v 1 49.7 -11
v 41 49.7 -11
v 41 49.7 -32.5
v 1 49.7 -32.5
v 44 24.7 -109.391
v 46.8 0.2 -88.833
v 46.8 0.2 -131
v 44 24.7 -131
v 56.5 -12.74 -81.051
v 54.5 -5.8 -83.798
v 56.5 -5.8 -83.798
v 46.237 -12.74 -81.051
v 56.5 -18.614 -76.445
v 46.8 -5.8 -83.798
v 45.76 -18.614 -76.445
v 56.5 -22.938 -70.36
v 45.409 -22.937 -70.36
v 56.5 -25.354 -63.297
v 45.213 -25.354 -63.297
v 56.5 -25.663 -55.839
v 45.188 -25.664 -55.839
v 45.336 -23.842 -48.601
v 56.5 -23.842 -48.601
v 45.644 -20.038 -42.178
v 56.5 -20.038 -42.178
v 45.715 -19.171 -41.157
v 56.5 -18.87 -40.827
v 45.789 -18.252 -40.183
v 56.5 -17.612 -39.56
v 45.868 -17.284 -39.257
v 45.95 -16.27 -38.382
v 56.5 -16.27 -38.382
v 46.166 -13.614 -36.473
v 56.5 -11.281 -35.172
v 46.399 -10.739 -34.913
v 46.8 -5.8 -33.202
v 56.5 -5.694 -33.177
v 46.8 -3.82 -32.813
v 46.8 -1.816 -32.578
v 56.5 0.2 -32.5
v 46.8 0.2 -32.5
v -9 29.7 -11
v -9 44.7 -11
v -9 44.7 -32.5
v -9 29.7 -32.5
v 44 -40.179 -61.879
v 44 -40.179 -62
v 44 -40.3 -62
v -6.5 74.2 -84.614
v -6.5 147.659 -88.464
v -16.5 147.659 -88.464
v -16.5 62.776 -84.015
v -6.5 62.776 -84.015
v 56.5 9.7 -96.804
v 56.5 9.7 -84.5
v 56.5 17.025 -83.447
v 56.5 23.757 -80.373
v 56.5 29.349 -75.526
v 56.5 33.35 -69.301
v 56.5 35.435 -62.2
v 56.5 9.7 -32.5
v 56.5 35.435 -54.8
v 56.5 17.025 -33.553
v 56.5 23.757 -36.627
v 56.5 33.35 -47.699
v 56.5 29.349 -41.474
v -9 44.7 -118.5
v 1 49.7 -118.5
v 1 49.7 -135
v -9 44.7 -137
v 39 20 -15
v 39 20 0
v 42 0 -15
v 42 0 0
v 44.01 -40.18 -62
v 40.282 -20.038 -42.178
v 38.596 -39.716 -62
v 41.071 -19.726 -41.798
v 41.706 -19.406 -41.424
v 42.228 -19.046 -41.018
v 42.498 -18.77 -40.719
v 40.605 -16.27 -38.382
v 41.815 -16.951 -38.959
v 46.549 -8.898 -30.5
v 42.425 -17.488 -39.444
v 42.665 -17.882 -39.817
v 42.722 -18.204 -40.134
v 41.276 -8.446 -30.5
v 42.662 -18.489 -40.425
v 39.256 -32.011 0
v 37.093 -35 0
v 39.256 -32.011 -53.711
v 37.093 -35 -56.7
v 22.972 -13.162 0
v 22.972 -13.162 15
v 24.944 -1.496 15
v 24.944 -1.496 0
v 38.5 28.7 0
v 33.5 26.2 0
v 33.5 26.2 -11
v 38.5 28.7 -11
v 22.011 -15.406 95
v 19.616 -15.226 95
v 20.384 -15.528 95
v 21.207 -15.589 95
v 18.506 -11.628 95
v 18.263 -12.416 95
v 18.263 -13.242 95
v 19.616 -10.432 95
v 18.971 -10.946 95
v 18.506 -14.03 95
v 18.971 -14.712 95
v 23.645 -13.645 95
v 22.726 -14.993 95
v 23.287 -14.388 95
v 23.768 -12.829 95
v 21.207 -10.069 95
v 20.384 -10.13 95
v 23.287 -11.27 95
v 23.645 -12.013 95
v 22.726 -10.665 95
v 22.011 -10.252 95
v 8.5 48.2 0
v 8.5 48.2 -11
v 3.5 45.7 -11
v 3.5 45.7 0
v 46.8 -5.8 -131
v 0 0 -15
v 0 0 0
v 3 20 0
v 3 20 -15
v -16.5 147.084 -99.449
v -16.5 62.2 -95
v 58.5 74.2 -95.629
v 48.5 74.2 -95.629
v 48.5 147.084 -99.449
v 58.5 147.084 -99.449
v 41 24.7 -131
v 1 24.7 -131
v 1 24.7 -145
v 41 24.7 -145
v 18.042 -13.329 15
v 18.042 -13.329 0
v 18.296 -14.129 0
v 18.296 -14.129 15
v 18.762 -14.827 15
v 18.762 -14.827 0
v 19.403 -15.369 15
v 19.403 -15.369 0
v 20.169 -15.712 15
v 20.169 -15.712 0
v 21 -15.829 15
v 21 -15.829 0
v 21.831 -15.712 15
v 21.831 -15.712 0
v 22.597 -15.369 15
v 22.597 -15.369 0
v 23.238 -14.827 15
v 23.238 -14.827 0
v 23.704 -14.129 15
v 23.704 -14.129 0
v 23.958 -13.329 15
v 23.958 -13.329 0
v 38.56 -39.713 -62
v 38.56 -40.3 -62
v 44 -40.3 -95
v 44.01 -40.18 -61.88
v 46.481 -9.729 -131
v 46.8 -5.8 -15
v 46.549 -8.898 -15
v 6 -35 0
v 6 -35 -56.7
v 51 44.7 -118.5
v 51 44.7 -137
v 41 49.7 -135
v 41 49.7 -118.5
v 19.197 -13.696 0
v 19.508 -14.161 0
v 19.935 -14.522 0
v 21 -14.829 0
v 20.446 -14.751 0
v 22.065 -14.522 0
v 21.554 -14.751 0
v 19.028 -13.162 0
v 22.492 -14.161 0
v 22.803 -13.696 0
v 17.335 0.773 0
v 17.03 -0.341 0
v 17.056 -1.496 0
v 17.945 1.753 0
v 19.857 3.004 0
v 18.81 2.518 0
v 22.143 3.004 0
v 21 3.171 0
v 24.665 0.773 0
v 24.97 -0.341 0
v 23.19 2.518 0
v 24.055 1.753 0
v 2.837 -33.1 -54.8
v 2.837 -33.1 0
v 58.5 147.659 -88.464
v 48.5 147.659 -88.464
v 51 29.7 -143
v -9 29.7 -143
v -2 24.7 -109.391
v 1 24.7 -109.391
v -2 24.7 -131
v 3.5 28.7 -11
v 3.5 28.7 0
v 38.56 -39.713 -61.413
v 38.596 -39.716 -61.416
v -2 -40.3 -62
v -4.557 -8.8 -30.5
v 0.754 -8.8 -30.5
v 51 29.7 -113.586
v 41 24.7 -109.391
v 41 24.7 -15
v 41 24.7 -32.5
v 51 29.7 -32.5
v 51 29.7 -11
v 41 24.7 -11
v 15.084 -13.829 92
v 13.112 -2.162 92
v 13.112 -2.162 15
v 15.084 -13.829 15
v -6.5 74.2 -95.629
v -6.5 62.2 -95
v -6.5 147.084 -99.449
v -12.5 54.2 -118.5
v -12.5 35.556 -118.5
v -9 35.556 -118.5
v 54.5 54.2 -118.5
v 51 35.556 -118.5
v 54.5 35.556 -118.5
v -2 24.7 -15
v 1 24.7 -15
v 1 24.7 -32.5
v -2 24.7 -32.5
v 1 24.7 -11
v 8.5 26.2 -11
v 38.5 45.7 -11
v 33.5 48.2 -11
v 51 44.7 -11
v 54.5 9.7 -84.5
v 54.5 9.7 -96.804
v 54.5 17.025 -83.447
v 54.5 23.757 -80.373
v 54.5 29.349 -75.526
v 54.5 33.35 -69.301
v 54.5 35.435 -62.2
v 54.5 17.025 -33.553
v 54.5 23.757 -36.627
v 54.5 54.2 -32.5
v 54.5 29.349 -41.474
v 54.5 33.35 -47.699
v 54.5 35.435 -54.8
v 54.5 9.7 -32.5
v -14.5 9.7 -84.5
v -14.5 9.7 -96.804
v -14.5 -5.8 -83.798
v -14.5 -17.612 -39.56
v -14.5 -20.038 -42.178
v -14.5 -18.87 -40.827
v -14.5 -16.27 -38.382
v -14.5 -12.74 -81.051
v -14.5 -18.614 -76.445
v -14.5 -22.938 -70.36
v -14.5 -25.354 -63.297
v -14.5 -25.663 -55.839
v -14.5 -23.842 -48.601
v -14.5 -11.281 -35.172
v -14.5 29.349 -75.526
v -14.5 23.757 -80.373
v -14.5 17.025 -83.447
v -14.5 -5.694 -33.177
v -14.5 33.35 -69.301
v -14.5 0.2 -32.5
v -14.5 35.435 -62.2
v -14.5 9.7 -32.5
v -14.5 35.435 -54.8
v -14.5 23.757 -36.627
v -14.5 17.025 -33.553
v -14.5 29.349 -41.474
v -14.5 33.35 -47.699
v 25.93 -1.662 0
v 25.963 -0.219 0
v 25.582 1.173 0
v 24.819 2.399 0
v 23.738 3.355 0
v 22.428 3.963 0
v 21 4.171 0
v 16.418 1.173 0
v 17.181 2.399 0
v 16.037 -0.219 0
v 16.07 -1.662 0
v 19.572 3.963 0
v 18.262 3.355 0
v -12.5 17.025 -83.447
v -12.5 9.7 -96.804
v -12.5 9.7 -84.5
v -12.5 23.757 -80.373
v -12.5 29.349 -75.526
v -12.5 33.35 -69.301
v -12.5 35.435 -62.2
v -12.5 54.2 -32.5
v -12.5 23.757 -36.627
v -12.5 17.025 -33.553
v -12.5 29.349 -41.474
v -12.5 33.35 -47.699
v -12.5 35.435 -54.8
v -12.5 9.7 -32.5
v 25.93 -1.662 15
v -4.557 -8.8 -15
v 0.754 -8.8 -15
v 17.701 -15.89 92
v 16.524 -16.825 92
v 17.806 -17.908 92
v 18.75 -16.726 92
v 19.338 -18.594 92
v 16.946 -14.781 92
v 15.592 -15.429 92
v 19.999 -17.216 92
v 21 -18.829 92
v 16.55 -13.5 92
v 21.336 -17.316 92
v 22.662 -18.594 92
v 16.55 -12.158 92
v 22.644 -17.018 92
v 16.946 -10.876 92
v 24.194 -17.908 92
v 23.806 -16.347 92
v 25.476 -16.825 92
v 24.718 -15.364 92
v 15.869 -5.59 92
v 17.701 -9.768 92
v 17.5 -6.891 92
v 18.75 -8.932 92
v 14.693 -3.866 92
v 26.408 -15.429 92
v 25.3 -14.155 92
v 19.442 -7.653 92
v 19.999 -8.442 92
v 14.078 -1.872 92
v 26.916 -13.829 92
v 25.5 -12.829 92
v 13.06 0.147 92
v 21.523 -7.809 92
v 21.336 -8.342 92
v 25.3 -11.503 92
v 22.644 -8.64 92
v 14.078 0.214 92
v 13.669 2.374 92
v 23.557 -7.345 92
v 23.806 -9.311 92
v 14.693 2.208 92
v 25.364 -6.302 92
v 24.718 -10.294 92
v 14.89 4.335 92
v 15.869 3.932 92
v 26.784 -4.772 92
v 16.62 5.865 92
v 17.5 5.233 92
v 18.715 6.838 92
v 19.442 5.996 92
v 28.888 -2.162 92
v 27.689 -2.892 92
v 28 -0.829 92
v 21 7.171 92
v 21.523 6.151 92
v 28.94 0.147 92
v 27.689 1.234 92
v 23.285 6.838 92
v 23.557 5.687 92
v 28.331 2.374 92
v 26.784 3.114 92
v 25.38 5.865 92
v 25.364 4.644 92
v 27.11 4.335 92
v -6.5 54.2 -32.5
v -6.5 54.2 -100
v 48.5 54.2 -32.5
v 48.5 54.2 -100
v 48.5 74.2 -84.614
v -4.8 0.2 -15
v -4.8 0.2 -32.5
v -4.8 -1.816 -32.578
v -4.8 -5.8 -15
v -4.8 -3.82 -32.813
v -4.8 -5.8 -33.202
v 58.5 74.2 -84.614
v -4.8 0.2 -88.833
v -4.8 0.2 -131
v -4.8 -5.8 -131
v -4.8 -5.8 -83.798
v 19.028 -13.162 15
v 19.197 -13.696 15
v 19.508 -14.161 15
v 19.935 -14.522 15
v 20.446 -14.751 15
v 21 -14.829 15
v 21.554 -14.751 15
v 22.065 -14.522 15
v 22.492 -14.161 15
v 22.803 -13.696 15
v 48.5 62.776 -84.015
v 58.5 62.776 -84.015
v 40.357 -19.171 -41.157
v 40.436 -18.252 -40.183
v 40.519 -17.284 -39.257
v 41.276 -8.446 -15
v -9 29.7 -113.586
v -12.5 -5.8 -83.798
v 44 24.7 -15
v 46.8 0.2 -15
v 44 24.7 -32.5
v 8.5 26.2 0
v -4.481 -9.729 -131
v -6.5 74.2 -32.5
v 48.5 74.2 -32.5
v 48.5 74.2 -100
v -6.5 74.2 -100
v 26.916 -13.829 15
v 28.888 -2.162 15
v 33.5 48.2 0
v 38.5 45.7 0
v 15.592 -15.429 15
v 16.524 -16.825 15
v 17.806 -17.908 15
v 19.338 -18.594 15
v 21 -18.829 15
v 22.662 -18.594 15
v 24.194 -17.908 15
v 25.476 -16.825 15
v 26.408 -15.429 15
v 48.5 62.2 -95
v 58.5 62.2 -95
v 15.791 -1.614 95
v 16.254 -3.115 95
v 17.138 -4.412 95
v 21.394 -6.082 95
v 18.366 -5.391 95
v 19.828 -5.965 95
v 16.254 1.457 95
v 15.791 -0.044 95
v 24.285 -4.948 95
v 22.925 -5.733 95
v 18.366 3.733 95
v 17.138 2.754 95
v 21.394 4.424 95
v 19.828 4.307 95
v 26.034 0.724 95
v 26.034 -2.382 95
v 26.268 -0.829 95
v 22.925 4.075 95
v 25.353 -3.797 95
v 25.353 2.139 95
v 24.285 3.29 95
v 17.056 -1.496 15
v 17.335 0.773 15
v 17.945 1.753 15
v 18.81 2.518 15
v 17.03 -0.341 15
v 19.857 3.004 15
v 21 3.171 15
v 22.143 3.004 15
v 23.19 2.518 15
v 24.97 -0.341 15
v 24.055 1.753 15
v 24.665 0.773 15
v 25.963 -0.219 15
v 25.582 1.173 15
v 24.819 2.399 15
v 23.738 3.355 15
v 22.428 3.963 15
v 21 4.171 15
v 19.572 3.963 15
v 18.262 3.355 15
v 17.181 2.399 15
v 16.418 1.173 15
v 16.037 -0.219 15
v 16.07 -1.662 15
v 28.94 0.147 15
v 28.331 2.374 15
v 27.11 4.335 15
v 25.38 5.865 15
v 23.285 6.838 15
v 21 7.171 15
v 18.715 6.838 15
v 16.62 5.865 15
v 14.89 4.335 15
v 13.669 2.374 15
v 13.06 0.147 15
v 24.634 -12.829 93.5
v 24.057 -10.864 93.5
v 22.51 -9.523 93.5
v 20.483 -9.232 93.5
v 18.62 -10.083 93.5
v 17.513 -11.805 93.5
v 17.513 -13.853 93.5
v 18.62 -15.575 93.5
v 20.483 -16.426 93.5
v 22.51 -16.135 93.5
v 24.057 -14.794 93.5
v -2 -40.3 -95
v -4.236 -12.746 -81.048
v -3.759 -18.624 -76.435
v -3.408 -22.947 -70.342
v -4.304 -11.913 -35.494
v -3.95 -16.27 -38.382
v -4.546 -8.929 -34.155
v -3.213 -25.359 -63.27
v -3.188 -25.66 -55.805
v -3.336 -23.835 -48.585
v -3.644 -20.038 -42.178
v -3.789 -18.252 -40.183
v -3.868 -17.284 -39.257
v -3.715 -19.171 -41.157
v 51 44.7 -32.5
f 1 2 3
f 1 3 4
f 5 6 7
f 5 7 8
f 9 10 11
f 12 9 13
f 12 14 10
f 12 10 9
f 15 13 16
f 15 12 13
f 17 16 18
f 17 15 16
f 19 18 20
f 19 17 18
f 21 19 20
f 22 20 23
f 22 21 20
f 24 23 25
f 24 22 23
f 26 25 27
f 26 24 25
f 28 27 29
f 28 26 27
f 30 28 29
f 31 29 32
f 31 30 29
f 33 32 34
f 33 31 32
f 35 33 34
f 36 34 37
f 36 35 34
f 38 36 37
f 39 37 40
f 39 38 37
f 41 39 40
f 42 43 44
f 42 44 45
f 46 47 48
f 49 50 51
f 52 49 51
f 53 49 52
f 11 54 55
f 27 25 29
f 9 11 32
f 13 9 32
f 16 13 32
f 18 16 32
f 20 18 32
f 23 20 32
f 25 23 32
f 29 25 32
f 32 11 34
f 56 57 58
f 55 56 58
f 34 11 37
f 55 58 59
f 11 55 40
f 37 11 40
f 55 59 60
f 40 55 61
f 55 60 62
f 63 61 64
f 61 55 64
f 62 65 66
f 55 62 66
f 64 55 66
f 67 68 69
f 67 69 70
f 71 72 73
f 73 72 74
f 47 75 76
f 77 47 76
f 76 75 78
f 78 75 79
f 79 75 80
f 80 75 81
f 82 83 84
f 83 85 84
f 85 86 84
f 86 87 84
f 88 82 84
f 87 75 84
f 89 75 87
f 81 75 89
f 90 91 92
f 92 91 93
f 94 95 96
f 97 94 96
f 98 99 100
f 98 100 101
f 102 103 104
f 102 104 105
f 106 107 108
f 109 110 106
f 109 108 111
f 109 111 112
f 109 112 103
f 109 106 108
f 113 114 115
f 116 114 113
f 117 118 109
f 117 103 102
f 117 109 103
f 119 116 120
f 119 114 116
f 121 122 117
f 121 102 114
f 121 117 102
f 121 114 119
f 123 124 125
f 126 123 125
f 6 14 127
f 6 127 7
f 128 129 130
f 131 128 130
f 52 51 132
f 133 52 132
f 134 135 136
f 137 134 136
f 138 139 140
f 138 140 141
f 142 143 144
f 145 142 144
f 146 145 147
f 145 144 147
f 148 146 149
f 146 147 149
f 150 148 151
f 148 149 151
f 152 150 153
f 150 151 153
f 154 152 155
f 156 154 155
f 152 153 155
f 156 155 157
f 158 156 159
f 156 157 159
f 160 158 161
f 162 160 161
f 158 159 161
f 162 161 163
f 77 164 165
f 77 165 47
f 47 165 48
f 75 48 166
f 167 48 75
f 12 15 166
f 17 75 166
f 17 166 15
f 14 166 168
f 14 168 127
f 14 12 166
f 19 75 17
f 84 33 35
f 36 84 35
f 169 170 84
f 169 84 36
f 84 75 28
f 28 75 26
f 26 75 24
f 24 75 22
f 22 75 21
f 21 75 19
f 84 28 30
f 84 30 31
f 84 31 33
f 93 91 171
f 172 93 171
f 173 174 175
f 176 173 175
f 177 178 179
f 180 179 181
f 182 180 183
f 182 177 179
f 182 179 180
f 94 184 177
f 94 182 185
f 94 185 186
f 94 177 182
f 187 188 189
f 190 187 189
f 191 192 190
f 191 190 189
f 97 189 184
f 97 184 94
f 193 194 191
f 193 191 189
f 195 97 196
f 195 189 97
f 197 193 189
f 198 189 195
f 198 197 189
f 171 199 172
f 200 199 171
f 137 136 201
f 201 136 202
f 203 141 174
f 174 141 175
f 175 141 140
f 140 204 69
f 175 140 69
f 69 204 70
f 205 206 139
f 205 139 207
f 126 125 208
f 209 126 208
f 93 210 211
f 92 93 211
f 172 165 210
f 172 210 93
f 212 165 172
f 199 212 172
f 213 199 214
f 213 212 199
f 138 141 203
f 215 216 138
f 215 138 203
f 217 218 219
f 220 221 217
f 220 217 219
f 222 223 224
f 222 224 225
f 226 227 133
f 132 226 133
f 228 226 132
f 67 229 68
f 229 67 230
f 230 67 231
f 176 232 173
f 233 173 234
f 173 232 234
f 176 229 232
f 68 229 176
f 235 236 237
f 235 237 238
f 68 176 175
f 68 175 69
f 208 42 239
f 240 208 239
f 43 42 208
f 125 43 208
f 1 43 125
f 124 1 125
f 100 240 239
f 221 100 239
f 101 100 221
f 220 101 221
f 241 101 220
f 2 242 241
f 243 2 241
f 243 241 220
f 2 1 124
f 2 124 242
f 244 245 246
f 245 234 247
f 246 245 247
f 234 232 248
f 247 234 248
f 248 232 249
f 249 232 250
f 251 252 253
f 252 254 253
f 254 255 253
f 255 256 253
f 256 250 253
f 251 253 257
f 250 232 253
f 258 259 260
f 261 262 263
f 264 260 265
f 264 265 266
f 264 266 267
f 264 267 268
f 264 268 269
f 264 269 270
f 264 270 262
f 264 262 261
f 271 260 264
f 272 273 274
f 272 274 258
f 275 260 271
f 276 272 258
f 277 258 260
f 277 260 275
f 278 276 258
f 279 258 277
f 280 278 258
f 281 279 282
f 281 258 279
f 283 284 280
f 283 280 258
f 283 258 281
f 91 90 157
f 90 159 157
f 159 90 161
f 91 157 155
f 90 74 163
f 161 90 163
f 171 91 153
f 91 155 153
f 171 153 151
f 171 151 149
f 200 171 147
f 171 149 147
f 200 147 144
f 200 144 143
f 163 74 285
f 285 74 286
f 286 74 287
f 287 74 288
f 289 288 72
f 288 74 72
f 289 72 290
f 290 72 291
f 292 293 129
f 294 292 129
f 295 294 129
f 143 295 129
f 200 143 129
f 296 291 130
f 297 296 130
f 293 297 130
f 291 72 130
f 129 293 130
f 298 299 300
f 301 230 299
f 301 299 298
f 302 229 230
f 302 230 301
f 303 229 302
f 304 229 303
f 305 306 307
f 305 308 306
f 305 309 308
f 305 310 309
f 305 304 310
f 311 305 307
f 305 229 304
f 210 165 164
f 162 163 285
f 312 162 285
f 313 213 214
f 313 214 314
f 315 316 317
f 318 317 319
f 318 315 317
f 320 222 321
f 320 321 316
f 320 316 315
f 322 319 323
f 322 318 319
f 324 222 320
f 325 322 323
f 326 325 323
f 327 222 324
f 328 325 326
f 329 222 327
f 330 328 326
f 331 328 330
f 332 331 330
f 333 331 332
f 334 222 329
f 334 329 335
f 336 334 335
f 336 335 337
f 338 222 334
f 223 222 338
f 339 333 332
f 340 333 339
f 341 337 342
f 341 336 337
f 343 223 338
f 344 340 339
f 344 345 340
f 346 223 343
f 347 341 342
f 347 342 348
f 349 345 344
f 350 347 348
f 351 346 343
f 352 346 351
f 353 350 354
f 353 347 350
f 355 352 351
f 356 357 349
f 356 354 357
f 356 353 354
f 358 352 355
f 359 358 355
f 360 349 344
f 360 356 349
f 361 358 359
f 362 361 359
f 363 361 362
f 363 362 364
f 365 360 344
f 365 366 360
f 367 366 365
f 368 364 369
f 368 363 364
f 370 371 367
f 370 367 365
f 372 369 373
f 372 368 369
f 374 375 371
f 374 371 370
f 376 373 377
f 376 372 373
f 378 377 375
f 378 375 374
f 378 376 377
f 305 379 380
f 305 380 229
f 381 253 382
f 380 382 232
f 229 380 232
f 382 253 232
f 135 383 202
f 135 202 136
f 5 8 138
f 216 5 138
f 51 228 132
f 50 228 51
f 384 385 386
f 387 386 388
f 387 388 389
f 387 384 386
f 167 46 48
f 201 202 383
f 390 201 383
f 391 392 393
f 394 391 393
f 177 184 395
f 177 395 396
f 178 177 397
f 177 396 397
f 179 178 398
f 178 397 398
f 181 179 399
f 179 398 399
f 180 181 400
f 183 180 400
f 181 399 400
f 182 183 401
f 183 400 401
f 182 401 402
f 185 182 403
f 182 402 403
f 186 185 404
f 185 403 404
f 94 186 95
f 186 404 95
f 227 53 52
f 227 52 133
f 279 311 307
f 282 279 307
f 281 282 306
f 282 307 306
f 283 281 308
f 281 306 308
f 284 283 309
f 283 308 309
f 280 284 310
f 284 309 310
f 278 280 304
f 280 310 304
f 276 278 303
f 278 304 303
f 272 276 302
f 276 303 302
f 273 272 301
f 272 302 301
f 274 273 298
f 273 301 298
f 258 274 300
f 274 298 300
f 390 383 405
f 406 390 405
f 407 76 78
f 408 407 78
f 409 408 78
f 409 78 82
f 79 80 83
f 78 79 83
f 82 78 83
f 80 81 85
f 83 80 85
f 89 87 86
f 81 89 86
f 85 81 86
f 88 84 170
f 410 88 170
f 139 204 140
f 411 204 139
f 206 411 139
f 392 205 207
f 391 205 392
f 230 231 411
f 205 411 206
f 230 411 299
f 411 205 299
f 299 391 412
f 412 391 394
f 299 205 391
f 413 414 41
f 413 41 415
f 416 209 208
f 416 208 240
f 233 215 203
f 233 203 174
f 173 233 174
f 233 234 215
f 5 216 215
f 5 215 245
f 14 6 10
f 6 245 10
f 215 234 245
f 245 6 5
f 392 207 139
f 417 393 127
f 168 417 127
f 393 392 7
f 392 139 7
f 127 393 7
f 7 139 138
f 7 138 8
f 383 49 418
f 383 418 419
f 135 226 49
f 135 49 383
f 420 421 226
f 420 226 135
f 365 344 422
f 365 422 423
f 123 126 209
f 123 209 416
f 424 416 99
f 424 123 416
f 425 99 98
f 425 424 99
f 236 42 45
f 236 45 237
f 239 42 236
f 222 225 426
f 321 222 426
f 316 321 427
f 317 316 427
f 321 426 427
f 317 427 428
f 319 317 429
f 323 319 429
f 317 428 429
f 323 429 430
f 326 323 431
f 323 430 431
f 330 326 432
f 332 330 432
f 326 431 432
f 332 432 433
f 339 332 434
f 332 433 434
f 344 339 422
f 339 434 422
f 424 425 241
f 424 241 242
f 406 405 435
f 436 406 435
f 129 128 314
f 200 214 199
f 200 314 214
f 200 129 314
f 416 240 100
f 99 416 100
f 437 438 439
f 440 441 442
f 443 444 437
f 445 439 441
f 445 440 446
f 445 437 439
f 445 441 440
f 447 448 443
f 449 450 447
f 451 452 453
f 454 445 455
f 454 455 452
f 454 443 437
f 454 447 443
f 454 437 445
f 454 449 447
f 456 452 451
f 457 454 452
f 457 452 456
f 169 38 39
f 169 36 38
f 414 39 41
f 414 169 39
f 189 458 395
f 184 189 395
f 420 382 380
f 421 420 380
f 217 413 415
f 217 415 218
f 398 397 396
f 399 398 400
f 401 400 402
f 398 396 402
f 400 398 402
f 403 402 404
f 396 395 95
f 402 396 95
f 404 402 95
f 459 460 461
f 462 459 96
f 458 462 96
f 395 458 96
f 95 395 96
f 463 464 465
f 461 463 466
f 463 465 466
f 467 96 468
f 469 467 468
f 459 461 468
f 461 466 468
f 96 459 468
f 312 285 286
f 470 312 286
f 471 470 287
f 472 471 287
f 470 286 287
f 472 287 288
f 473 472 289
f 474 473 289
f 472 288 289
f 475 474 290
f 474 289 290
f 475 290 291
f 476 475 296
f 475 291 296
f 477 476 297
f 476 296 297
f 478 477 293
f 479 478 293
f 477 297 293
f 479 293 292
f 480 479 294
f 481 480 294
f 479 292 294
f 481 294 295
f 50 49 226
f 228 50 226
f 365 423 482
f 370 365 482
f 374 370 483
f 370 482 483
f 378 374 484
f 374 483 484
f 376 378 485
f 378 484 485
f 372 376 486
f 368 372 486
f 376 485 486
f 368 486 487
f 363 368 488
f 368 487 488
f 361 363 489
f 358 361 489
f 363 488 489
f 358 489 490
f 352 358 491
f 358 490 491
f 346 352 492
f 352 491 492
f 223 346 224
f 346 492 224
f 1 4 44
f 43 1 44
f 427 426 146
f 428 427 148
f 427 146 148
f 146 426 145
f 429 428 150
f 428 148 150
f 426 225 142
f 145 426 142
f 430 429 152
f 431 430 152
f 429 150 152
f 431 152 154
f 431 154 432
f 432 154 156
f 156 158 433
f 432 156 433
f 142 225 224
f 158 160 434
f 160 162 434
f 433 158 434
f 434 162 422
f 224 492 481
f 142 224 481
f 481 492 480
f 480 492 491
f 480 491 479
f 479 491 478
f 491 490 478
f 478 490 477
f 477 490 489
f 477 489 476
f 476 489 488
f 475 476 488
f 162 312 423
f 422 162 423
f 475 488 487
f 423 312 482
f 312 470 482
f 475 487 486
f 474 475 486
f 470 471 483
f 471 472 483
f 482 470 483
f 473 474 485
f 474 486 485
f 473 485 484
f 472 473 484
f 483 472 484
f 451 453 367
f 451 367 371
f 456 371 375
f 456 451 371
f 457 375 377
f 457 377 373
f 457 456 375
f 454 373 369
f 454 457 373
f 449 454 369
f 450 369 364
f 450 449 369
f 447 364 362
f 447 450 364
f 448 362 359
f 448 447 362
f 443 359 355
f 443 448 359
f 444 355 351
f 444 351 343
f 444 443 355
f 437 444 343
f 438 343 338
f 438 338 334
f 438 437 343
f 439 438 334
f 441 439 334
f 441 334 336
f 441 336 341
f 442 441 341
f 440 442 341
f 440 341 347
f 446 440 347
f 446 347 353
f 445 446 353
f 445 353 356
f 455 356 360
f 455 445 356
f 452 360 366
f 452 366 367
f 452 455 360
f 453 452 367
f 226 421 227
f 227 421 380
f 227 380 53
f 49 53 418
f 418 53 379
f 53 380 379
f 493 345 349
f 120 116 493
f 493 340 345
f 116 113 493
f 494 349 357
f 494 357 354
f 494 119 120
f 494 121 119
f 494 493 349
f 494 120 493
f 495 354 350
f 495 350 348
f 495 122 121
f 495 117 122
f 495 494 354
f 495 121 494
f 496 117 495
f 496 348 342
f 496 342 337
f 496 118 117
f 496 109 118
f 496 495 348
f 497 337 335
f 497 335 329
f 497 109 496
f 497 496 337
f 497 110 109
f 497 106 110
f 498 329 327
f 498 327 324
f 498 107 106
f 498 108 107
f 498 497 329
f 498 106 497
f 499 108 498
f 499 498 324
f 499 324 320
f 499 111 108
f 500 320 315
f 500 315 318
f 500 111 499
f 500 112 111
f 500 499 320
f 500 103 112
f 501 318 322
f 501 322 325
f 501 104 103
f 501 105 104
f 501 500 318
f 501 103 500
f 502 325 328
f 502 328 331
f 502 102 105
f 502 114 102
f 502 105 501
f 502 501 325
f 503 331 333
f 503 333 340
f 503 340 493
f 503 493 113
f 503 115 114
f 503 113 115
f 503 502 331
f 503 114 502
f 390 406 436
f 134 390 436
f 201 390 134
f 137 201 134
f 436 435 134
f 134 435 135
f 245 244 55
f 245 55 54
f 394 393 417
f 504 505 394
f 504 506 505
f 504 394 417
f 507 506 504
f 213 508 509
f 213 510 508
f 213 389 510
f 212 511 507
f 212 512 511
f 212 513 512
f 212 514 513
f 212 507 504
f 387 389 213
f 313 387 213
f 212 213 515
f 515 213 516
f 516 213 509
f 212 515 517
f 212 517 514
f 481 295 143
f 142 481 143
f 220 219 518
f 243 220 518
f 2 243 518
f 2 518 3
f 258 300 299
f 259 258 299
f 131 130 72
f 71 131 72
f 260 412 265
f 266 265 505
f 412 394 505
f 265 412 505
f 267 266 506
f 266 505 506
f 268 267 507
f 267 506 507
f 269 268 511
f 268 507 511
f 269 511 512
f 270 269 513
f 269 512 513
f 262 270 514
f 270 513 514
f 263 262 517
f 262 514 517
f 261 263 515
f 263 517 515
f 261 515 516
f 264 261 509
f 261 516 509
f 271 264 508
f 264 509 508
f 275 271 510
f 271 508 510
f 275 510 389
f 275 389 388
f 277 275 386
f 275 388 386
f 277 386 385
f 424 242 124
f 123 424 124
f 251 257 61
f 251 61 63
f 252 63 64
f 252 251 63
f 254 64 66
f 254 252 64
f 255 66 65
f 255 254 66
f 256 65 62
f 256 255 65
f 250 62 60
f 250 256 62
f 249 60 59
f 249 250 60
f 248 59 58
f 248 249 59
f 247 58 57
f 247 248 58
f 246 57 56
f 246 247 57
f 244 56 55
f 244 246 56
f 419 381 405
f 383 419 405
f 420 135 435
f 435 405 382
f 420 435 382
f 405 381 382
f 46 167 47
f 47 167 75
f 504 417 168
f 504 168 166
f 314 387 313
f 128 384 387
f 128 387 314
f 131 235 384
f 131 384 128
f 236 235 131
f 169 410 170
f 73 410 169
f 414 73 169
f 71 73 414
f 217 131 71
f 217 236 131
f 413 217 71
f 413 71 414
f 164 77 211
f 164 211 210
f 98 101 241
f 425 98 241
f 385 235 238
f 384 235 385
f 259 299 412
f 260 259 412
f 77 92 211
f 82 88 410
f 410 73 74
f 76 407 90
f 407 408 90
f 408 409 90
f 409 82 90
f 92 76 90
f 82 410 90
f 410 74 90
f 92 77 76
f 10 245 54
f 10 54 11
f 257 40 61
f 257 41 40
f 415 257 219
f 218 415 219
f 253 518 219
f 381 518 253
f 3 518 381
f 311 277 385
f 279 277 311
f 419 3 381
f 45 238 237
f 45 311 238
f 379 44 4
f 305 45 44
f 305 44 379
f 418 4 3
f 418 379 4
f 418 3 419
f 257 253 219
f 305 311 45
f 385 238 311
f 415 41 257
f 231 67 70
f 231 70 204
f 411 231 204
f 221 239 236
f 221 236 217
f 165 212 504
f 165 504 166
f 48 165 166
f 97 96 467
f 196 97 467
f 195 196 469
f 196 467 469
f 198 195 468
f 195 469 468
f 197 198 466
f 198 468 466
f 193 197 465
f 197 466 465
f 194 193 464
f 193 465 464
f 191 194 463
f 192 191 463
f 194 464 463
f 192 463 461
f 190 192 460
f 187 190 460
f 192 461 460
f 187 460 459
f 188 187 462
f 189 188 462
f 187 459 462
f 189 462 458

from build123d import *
from OCP.BRepFilletAPI import BRepFilletAPI_MakeChamfer

# Parameters (mm, degrees)
EXTRUDE_1_DEPTH     = 131
EXTRUDE_2_DEPTH     = 116
CUT_EXTRUDE_1_REACH = 148.45
CUT_EXTRUDE_2_REACH = 148.994
EXTRUDE_3_DEPTH     = 134
CUT_EXTRUDE_3_DEPTH = 67
EXTRUDE_4_DEPTH     = 11
EXTRUDE_START       = -33.5
EXTRUDE_5_DEPTH     = 67
EXTRUDE_6_DEPTH     = 2
EXTRUDE_7_DEPTH     = 20
EXTRUDE_8_DEPTH     = 10
EXTRUDE_9_DEPTH     = 10
CUT_EXTRUDE_4_REACH = 246.491
SKETCH_16_W         = 5.440253517
SKETCH_16_H         = 47
CUT_EXTRUDE_5_DEPTH = 219.790404517
EXTRUDE_10_DEPTH    = 15
CUT_EXTRUDE_6_DEPTH = 15
EXTRUDE_15_DEPTH    = 77
SKETCH_23_R         = 7
SKETCH_23_R_2       = 4.5
EXTRUDE_16_DEPTH    = 3
CHAMFER_1_SIZE      = 3
CHAMFER_1_SIZE_2    = 1.732050808
CHAMFER_2_SIZE      = 3
CHAMFER_2_SIZE2     = 1.907428497


# Read off the part's stored shape, not the designer's step: 凸台-拉伸5
with BuildPart() as part:
    # 草图1 → 凸台-拉伸1 (new body)
    with BuildSketch(Plane.XY):
        Polygon((0, 0), (3, 20), (39, 20), (42, 0), (39, -35), (3, -35), align=None)
    extrude(amount=-EXTRUDE_1_DEPTH)

    # 草图2 → 凸台-拉伸2 (add)
    with BuildSketch(Plane.XY.offset(-15)):
        Polygon((-2, 24.7), (-4.8, 0.2), (-4.8, -5.8), (-2, -40.3), (21, -40.3), (21, -35), (3, -35), (0, 0), (3, 20), (21, 20), (21, 24.7), align=None)
        Polygon((44, 24.7), (21, 24.7), (21, 20), (39, 20), (42, 0), (39, -35), (21, -35), (21, -40.3), (44, -40.3), (46.8, -5.8), (46.8, 0.2), align=None)
    extrude(amount=-EXTRUDE_2_DEPTH)

    # 切除-拉伸1: up to this plane
    cut_extrude_1_end = Plane(origin=(3, -35, -131), z_dir=(-0.996346649041751, -0.08540114134643588, 0))
    # 草图3 → 切除-拉伸1 (cut, up to the surface)
    with BuildSketch(Plane.ZY.offset(4.8), mode=Mode.PRIVATE) as cut_extrude_1_sk1:
        Polygon((-131, -40.3), (-131, -10.092413278), (-95, -40.3), align=None)
    cut_extrude_1_tool1 = split(extrude(cut_extrude_1_sk1.sketch, amount=-CUT_EXTRUDE_1_REACH, mode=Mode.PRIVATE), bisect_by=cut_extrude_1_end, keep=Keep.BOTH, mode=Mode.PRIVATE)
    add(cut_extrude_1_tool1.solids().sort_by_distance((-4.8, -30.230804, -119))[0], mode=Mode.SUBTRACT)
    # 草图3 → 切除-拉伸1 (cut, up to the surface)
    with BuildSketch(Plane.ZY.offset(4.8), mode=Mode.PRIVATE) as cut_extrude_1_sk2:
        Polygon((-62, -40.3), (-30.5, -8.8), (-15, -8.8), (-15, -40.3), align=None)
    cut_extrude_1_tool2 = split(extrude(cut_extrude_1_sk2.sketch, amount=-CUT_EXTRUDE_1_REACH, mode=Mode.PRIVATE), bisect_by=cut_extrude_1_end, keep=Keep.BOTH, mode=Mode.PRIVATE)
    add(cut_extrude_1_tool2.solids().sort_by_distance((-4.8, -27.196, -31.948))[0], mode=Mode.SUBTRACT)

    # 切除-拉伸2: up to this plane
    cut_extrude_2_end = Plane(origin=(42, 0, -131), z_dir=(0.996346649041751, -0.08540114134643569, 0))
    # 草图4 → 切除-拉伸2 (cut, up to the surface)
    with BuildSketch(Plane(origin=(46.8, 0, 0), x_dir=(0, 0, -1), z_dir=(1, 0, 0)), mode=Mode.PRIVATE) as cut_extrude_2_sk1:
        Polygon((15, -8.919073988), (15, -40.419073988), (62, -40.419073988), (30.5, -8.919073988), align=None)
    cut_extrude_2_tool1 = split(extrude(cut_extrude_2_sk1.sketch, amount=CUT_EXTRUDE_2_REACH, dir=(-0.996346649042, 0.085401141346, 0), mode=Mode.PRIVATE), bisect_by=cut_extrude_2_end, keep=Keep.BOTH, mode=Mode.PRIVATE)
    add(cut_extrude_2_tool1.solids().sort_by_distance((46.8, -27.315074, -31.948))[0], mode=Mode.SUBTRACT)

    # 草图6 → 凸台-拉伸3 (add)
    with BuildSketch(Plane.XY.offset(-11)):
        Polygon((-9, 29.7), (1, 24.7), (41, 24.7), (51, 29.7), (51, 44.7), (41, 49.7), (1, 49.7), (-9, 44.7), align=None)
    extrude(amount=-EXTRUDE_3_DEPTH)

    # 草图7 → 切除-拉伸3 (cut, symmetric)
    with BuildSketch(Plane.ZY.offset(4.8)):
        Polygon((-95, -40.3), (-131, -40.3), (-131, -9.728583388), align=None)
        Polygon((-145, 24.7), (-135, 49.7), (-145, 49.7), align=None)
    extrude(amount=CUT_EXTRUDE_3_DEPTH, both=True, mode=Mode.SUBTRACT)

    # 草图9 → 凸台-拉伸4 (add)
    with BuildSketch(Plane.XY.offset(-11)):
        Polygon((3.5, 45.7), (3.5, 28.7), (8.5, 26.2), (33.5, 26.2), (38.5, 28.7), (38.5, 45.7), (33.5, 48.2), (8.5, 48.2), align=None)
    extrude(amount=EXTRUDE_4_DEPTH)

    # 凸台-拉伸5 outline → 凸台-拉伸5 (add)
    with BuildSketch(Plane.ZY.offset(-21).offset(EXTRUDE_START)):
        with BuildLine():
            Line((-118.5, 35.555969457), (-83.798221281, -5.8))
            ThreePointArc((-83.798221281, -5.8), (-66.915700425, -24.400324924), (-42.17780049, -20.038226285))
            ThreePointArc((-42.17780049, -20.038226285), (-40.182635106, -18.251941452), (-38.381793618, -16.269905038))
            ThreePointArc((-38.381793618, -16.269905038), (-34.014561818, -8.544330565), (-32.5, 0.2))
            Line((-32.5, 0.2), (-32.5, 54.2))
            Line((-32.5, 54.2), (-118.5, 54.2))
            Line((-118.5, 54.2), (-118.5, 35.555969457))
        make_face()
    extrude(amount=EXTRUDE_5_DEPTH)

    # 草图11 → 凸台-拉伸6 (add)
    with BuildSketch(Plane.ZY.offset(12.5)):
        with BuildLine():
            Line((-84.5, 9.7), (-96.804265564, 9.7))
            Line((-96.804265564, 9.7), (-83.798221281, -5.8))
            ThreePointArc((-83.798221281, -5.8), (-66.915700425, -24.400324924), (-42.17780049, -20.038226285))
            ThreePointArc((-42.17780049, -20.038226285), (-40.182635106, -18.251941452), (-38.381793618, -16.269905038))
            ThreePointArc((-38.381793618, -16.269905038), (-34.014561818, -8.544330565), (-32.5, 0.2))
            Line((-32.5, 0.2), (-32.5, 9.7))
            ThreePointArc((-32.5, 9.7), (-58.5, 35.7), (-84.5, 9.7))
        make_face()
    extrude_6 = extrude(amount=EXTRUDE_6_DEPTH)

    # 镜向1: 凸台-拉伸6 across plane
    add(extrude_6.mirror(Plane.ZY.offset(-21)))

    # 草图12 → 凸台-拉伸7 (add)
    with BuildSketch(Plane(origin=(0, 54.2, 0), x_dir=(1, 0, 0), z_dir=(0, 1, 0))):
        Polygon((21, 100), (-6.5, 100), (-6.5, 32.5), (48.5, 32.5), (48.5, 100), align=None)
    extrude(amount=EXTRUDE_7_DEPTH)

    # 草图13 → 凸台-拉伸8 (add)
    with BuildSketch(Plane.ZY.offset(6.5)):
        Polygon((-95, 62.2), (-99.448556281, 147.083510454), (-88.463631398, 147.659205973), (-84.015075118, 62.775695519), align=None)
    extrude(amount=EXTRUDE_8_DEPTH)

    # 草图14 → 凸台-拉伸9 (add)
    with BuildSketch(Plane(origin=(48.5, 0, 0), x_dir=(0, 0, -1), z_dir=(1, 0, 0))):
        Polygon((84.613797545, 74.2), (95.628893351, 74.2), (99.448556281, 147.083510454), (88.463631398, 147.659205973), align=None)
        Polygon((84.015075118, 62.775695519), (95, 62.2), (95.628893351, 74.2), (84.613797545, 74.2), align=None)
    extrude(amount=EXTRUDE_9_DEPTH)

    # 切除-拉伸4: up to this plane
    cut_extrude_4_end = Plane(origin=(-16.436947072, -34.998764239, 0), z_dir=(-0.08540114134643567, -0.996346649041751, 0))
    # 草图16 → 切除-拉伸4 (cut, up to the surface)
    with BuildSketch(Plane.XZ.offset(40.3), mode=Mode.PRIVATE) as cut_extrude_4_sk1:
        with Locations((41.279873241, -38.5)):
            Rectangle(SKETCH_16_W, SKETCH_16_H)
    cut_extrude_4_tool1 = split(extrude(cut_extrude_4_sk1.sketch, amount=-CUT_EXTRUDE_4_REACH, mode=Mode.PRIVATE), bisect_by=cut_extrude_4_end, keep=Keep.BOTH, mode=Mode.PRIVATE)
    add(cut_extrude_4_tool1.solids().sort_by_distance((41.279873, -40.3, -38.5))[0], mode=Mode.SUBTRACT)

    # 草图17 → 切除-拉伸5 (cut, through all)
    with BuildSketch(Plane.ZY.offset(12.5)):
        Polygon((-15, -40.3), (-15, -35), (-56.7, -35), (-62, -40.3), align=None)
    extrude(amount=-CUT_EXTRUDE_5_DEPTH, mode=Mode.SUBTRACT)

    # 草图18 → 凸台-拉伸10 (add)
    with BuildSketch(Plane.XY):
        with BuildLine():
            Line((16.069933514, -1.66230637), (18.041960108, -13.328973037))
            ThreePointArc((18.041960108, -13.328973037), (21, -15.828973037), (23.958039892, -13.328973037))
            Line((23.958039892, -13.328973037), (25.930066486, -1.66230637))
            ThreePointArc((25.930066486, -1.66230637), (21, 4.171026963), (16.069933514, -1.66230637))
        make_face()
    extrude(amount=EXTRUDE_10_DEPTH)

    # 草图20 → 切除-拉伸6 (cut)
    with BuildSketch(Plane.XY.offset(15)):
        with BuildLine():
            Line((17.055946811, -1.495639704), (19.027973406, -13.16230637))
            ThreePointArc((19.027973406, -13.16230637), (21, -14.828973037), (22.972026594, -13.16230637))
            Line((22.972026594, -13.16230637), (24.944053189, -1.495639704))
            ThreePointArc((24.944053189, -1.495639704), (21, 3.171026963), (17.055946811, -1.495639704))
        make_face()
    extrude(amount=-CUT_EXTRUDE_6_DEPTH, mode=Mode.SUBTRACT)

    # 草图21 → 凸台-拉伸15 (add)
    with BuildSketch(Plane.XY.offset(15)):
        with BuildLine():
            Line((13.111893623, -2.16230637), (15.083920217, -13.828973037))
            ThreePointArc((15.083920217, -13.828973037), (21, -18.828973037), (26.916079783, -13.828973037))
            Line((26.916079783, -13.828973037), (28.888106377, -2.16230637))
            ThreePointArc((28.888106377, -2.16230637), (21, 7.171026963), (13.111893623, -2.16230637))
        make_face()
    extrude(amount=EXTRUDE_15_DEPTH)

    # 草图23 → 凸台-拉伸16 (add)
    with BuildSketch(Plane.XY.offset(92)):
        with Locations((21, -0.828973037)):
            Circle(SKETCH_23_R)
        with Locations((21, -12.828973037)):
            Circle(SKETCH_23_R_2)
    extrude(amount=EXTRUDE_16_DEPTH)

    # 倒角1
    chamfer_1_edges_1 = [part.edges().sort_by_distance(p)[0] for p in [
        (14, -0.828973037, 95),
    ]]
    chamfer_1_side_1 = [part.faces().sort_by_distance(p)[0] for p in [
        (14, -0.828973037, 94.965358984),
    ]]
    chamfer_1_edges_2 = [part.edges().sort_by_distance(p)[0] for p in [
        (16.5, -12.828973037, 95),
    ]]
    chamfer_1_side_2 = [part.faces().sort_by_distance(p)[0] for p in [
        (16.5, -12.828973037, 94.965358984),
    ]]
    chamfer_1 = BRepFilletAPI_MakeChamfer(part.part.solid().wrapped)
    for e in chamfer_1_edges_1:
        chamfer_1.Add(CHAMFER_1_SIZE - 0.0001, CHAMFER_1_SIZE_2 - 0.0001, e.wrapped, chamfer_1_side_1[0].wrapped)
    for e in chamfer_1_edges_2:
        chamfer_1.Add(CHAMFER_1_SIZE - 0.0001, CHAMFER_1_SIZE_2 - 0.0001, e.wrapped, chamfer_1_side_2[0].wrapped)
    add(Compound.cast(chamfer_1.Shape()), mode=Mode.REPLACE)  # a hair under: the kernel refuses the full size

    # 倒角2: one chamfer whose edges measure the first distance from different faces: ONE call of the kernel's chamfer builder (chamfer() names one face for all edges)
    chamfer_2_edges_1 = [part.edges().sort_by_distance(p)[0] for p in [
        (3, -35, -28.35),
    ]]
    chamfer_2_side_1 = [part.faces().sort_by_distance(p)[0] for p in [
        (21, -35, -28.35),
    ]]
    chamfer_2_edges_2 = [part.edges().sort_by_distance(p)[0] for p in [
        (39, -35, -28.35),
    ]]
    chamfer_2_side_2 = [part.faces().sort_by_distance(p)[0] for p in [
        (40.177893681, -21.257907057, -21.206076587),
    ]]
    chamfer_2 = BRepFilletAPI_MakeChamfer(part.part.solid().wrapped)
    for e in chamfer_2_edges_1:
        chamfer_2.Add(CHAMFER_2_SIZE, CHAMFER_2_SIZE2, e.wrapped, chamfer_2_side_1[0].wrapped)  # the first distance lies on this face
    for e in chamfer_2_edges_2:
        chamfer_2.Add(CHAMFER_2_SIZE, CHAMFER_2_SIZE2, e.wrapped, chamfer_2_side_2[0].wrapped)  # the first distance lies on this face
    add(Compound.cast(chamfer_2.Shape()), mode=Mode.REPLACE)


solid = part.part
